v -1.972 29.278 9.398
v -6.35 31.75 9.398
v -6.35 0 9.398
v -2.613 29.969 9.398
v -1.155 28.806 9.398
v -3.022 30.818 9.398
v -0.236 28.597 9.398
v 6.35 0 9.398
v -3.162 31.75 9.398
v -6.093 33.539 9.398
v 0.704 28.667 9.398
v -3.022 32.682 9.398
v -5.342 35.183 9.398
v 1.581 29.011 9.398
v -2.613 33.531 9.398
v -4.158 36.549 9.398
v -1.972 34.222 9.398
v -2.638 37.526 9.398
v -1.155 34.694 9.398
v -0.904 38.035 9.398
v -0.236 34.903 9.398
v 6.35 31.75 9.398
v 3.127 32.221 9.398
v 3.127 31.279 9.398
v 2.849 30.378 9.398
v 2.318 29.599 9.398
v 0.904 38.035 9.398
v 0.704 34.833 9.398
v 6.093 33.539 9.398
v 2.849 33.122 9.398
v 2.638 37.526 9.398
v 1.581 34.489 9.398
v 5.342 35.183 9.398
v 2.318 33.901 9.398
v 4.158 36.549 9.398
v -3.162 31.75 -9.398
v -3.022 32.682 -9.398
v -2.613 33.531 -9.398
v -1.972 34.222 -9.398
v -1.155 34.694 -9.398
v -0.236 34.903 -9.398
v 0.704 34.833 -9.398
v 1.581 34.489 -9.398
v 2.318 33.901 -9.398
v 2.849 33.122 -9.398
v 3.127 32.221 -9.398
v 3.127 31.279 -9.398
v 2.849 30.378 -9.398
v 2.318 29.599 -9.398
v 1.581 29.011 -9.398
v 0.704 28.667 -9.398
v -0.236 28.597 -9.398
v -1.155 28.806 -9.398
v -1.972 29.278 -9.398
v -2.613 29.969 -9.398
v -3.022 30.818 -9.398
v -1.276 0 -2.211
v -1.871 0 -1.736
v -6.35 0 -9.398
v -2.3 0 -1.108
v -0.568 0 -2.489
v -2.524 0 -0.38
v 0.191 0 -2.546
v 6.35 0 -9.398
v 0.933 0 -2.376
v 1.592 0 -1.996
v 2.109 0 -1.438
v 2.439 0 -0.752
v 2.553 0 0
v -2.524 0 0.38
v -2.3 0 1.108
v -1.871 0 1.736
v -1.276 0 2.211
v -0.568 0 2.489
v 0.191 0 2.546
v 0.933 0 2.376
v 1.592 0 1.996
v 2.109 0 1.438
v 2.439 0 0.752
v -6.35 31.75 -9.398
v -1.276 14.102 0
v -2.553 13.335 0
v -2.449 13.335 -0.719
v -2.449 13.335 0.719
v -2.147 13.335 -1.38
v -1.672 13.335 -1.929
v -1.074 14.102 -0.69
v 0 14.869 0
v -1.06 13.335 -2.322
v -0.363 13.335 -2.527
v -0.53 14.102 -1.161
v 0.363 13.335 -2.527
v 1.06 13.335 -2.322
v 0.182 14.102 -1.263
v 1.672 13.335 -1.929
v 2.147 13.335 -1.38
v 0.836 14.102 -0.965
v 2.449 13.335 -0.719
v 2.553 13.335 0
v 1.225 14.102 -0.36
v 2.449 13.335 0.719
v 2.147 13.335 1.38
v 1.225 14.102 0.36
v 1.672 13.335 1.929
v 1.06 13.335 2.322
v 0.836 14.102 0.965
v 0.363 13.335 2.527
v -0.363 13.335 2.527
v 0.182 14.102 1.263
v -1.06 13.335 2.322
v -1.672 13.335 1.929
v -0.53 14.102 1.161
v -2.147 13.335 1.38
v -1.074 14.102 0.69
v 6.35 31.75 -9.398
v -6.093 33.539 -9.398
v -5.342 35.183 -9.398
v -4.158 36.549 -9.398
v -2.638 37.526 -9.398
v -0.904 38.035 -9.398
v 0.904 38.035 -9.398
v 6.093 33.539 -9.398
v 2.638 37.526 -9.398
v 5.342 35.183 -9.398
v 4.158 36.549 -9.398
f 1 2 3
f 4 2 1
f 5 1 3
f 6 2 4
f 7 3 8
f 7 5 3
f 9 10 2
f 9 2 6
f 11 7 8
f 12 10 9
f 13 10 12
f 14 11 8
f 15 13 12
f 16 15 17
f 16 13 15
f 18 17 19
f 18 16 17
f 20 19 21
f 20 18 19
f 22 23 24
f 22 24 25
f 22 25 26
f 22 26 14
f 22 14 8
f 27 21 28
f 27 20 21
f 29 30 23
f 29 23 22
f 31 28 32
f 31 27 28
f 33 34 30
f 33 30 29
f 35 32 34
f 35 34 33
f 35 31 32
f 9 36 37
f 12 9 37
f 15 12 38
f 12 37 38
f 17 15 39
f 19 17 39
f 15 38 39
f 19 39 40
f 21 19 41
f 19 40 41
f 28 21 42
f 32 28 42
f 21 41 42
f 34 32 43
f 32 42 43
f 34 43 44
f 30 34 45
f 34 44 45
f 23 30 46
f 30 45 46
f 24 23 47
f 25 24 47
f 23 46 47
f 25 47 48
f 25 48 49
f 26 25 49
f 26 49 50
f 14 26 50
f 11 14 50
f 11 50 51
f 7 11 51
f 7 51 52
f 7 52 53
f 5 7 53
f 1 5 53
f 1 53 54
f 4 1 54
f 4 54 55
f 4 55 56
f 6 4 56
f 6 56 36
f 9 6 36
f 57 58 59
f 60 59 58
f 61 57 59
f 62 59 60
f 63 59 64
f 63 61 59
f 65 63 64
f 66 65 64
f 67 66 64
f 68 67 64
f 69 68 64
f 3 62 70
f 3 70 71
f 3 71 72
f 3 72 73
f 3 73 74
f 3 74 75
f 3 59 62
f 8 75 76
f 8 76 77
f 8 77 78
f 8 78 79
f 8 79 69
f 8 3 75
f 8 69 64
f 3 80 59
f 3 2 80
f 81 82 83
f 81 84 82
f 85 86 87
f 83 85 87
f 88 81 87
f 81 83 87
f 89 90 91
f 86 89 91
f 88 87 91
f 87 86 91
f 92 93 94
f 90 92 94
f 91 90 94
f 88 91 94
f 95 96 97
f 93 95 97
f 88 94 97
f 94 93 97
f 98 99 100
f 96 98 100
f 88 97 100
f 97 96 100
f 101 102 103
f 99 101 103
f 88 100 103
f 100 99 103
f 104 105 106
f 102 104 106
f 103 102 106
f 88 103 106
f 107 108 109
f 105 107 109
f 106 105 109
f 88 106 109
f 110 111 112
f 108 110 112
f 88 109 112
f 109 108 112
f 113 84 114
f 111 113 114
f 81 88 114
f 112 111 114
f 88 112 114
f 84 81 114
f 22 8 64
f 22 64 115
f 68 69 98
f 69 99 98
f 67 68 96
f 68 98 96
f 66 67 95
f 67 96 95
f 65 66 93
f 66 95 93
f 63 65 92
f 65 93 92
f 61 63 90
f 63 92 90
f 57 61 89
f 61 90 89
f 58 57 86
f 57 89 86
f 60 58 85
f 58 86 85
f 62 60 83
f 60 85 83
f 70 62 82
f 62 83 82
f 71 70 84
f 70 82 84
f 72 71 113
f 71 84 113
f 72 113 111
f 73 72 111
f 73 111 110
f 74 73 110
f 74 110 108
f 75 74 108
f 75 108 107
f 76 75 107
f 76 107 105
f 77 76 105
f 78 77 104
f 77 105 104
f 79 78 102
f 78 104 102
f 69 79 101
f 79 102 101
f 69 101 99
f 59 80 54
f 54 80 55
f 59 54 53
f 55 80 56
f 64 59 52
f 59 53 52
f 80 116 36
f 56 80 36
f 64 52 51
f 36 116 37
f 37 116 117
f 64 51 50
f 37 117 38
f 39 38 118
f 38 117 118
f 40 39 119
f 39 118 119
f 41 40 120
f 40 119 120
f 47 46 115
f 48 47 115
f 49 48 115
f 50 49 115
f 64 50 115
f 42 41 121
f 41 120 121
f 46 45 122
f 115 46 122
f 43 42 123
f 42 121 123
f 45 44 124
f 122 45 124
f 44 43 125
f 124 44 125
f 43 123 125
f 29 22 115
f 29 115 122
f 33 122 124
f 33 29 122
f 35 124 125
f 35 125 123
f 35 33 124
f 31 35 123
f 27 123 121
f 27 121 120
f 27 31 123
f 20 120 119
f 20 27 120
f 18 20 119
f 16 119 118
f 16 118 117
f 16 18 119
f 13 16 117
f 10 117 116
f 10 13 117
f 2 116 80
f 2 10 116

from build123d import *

# Parameters (mm, degrees)
BOSS_EXTRUDE1_DEPTH         = 9.398
F_1_4_0_249_DOWEL_HOLE1_D   = 6.3246
F_1_4_20_TAPPED_HOLE1_D     = 5.1054
F_1_4_20_TAPPED_HOLE1_DEPTH = 13.335
F_1_4_20_TAPPED_HOLE1_TIP   = 1.533816902


with BuildPart() as part:
    # Sketch2 → Boss-Extrude1 (new body, symmetric)
    with BuildSketch(Plane.XY):
        with BuildLine():
            Line((-6.35, 0), (6.35, 0))
            Line((6.35, 0), (6.35, 31.75))
            ThreePointArc((6.35, 31.75), (0, 38.1), (-6.35, 31.75))
            Line((-6.35, 31.75), (-6.35, 0))
        make_face()
    extrude(amount=BOSS_EXTRUDE1_DEPTH, both=True)

    # 1/4 (0.249) Dowel Hole1 (through all)
    with Locations(Plane.XY.offset(9.398)):
        with Locations((0, 31.75)):
            Hole(F_1_4_0_249_DOWEL_HOLE1_D / 2)

    # 1/4-20 Tapped Hole1
    with Locations(Plane(origin=(0, 0, 0), x_dir=(-1, 0, 0), z_dir=(0, -1, 0))):
        with Locations((0, 0)):
            Hole(F_1_4_20_TAPPED_HOLE1_D / 2, depth=F_1_4_20_TAPPED_HOLE1_DEPTH)
            with Locations((0, 0, -(F_1_4_20_TAPPED_HOLE1_DEPTH + F_1_4_20_TAPPED_HOLE1_TIP / 2))):  # 118° drill point
                Cone(0, F_1_4_20_TAPPED_HOLE1_D / 2, F_1_4_20_TAPPED_HOLE1_TIP, mode=Mode.SUBTRACT)


solid = part.part
